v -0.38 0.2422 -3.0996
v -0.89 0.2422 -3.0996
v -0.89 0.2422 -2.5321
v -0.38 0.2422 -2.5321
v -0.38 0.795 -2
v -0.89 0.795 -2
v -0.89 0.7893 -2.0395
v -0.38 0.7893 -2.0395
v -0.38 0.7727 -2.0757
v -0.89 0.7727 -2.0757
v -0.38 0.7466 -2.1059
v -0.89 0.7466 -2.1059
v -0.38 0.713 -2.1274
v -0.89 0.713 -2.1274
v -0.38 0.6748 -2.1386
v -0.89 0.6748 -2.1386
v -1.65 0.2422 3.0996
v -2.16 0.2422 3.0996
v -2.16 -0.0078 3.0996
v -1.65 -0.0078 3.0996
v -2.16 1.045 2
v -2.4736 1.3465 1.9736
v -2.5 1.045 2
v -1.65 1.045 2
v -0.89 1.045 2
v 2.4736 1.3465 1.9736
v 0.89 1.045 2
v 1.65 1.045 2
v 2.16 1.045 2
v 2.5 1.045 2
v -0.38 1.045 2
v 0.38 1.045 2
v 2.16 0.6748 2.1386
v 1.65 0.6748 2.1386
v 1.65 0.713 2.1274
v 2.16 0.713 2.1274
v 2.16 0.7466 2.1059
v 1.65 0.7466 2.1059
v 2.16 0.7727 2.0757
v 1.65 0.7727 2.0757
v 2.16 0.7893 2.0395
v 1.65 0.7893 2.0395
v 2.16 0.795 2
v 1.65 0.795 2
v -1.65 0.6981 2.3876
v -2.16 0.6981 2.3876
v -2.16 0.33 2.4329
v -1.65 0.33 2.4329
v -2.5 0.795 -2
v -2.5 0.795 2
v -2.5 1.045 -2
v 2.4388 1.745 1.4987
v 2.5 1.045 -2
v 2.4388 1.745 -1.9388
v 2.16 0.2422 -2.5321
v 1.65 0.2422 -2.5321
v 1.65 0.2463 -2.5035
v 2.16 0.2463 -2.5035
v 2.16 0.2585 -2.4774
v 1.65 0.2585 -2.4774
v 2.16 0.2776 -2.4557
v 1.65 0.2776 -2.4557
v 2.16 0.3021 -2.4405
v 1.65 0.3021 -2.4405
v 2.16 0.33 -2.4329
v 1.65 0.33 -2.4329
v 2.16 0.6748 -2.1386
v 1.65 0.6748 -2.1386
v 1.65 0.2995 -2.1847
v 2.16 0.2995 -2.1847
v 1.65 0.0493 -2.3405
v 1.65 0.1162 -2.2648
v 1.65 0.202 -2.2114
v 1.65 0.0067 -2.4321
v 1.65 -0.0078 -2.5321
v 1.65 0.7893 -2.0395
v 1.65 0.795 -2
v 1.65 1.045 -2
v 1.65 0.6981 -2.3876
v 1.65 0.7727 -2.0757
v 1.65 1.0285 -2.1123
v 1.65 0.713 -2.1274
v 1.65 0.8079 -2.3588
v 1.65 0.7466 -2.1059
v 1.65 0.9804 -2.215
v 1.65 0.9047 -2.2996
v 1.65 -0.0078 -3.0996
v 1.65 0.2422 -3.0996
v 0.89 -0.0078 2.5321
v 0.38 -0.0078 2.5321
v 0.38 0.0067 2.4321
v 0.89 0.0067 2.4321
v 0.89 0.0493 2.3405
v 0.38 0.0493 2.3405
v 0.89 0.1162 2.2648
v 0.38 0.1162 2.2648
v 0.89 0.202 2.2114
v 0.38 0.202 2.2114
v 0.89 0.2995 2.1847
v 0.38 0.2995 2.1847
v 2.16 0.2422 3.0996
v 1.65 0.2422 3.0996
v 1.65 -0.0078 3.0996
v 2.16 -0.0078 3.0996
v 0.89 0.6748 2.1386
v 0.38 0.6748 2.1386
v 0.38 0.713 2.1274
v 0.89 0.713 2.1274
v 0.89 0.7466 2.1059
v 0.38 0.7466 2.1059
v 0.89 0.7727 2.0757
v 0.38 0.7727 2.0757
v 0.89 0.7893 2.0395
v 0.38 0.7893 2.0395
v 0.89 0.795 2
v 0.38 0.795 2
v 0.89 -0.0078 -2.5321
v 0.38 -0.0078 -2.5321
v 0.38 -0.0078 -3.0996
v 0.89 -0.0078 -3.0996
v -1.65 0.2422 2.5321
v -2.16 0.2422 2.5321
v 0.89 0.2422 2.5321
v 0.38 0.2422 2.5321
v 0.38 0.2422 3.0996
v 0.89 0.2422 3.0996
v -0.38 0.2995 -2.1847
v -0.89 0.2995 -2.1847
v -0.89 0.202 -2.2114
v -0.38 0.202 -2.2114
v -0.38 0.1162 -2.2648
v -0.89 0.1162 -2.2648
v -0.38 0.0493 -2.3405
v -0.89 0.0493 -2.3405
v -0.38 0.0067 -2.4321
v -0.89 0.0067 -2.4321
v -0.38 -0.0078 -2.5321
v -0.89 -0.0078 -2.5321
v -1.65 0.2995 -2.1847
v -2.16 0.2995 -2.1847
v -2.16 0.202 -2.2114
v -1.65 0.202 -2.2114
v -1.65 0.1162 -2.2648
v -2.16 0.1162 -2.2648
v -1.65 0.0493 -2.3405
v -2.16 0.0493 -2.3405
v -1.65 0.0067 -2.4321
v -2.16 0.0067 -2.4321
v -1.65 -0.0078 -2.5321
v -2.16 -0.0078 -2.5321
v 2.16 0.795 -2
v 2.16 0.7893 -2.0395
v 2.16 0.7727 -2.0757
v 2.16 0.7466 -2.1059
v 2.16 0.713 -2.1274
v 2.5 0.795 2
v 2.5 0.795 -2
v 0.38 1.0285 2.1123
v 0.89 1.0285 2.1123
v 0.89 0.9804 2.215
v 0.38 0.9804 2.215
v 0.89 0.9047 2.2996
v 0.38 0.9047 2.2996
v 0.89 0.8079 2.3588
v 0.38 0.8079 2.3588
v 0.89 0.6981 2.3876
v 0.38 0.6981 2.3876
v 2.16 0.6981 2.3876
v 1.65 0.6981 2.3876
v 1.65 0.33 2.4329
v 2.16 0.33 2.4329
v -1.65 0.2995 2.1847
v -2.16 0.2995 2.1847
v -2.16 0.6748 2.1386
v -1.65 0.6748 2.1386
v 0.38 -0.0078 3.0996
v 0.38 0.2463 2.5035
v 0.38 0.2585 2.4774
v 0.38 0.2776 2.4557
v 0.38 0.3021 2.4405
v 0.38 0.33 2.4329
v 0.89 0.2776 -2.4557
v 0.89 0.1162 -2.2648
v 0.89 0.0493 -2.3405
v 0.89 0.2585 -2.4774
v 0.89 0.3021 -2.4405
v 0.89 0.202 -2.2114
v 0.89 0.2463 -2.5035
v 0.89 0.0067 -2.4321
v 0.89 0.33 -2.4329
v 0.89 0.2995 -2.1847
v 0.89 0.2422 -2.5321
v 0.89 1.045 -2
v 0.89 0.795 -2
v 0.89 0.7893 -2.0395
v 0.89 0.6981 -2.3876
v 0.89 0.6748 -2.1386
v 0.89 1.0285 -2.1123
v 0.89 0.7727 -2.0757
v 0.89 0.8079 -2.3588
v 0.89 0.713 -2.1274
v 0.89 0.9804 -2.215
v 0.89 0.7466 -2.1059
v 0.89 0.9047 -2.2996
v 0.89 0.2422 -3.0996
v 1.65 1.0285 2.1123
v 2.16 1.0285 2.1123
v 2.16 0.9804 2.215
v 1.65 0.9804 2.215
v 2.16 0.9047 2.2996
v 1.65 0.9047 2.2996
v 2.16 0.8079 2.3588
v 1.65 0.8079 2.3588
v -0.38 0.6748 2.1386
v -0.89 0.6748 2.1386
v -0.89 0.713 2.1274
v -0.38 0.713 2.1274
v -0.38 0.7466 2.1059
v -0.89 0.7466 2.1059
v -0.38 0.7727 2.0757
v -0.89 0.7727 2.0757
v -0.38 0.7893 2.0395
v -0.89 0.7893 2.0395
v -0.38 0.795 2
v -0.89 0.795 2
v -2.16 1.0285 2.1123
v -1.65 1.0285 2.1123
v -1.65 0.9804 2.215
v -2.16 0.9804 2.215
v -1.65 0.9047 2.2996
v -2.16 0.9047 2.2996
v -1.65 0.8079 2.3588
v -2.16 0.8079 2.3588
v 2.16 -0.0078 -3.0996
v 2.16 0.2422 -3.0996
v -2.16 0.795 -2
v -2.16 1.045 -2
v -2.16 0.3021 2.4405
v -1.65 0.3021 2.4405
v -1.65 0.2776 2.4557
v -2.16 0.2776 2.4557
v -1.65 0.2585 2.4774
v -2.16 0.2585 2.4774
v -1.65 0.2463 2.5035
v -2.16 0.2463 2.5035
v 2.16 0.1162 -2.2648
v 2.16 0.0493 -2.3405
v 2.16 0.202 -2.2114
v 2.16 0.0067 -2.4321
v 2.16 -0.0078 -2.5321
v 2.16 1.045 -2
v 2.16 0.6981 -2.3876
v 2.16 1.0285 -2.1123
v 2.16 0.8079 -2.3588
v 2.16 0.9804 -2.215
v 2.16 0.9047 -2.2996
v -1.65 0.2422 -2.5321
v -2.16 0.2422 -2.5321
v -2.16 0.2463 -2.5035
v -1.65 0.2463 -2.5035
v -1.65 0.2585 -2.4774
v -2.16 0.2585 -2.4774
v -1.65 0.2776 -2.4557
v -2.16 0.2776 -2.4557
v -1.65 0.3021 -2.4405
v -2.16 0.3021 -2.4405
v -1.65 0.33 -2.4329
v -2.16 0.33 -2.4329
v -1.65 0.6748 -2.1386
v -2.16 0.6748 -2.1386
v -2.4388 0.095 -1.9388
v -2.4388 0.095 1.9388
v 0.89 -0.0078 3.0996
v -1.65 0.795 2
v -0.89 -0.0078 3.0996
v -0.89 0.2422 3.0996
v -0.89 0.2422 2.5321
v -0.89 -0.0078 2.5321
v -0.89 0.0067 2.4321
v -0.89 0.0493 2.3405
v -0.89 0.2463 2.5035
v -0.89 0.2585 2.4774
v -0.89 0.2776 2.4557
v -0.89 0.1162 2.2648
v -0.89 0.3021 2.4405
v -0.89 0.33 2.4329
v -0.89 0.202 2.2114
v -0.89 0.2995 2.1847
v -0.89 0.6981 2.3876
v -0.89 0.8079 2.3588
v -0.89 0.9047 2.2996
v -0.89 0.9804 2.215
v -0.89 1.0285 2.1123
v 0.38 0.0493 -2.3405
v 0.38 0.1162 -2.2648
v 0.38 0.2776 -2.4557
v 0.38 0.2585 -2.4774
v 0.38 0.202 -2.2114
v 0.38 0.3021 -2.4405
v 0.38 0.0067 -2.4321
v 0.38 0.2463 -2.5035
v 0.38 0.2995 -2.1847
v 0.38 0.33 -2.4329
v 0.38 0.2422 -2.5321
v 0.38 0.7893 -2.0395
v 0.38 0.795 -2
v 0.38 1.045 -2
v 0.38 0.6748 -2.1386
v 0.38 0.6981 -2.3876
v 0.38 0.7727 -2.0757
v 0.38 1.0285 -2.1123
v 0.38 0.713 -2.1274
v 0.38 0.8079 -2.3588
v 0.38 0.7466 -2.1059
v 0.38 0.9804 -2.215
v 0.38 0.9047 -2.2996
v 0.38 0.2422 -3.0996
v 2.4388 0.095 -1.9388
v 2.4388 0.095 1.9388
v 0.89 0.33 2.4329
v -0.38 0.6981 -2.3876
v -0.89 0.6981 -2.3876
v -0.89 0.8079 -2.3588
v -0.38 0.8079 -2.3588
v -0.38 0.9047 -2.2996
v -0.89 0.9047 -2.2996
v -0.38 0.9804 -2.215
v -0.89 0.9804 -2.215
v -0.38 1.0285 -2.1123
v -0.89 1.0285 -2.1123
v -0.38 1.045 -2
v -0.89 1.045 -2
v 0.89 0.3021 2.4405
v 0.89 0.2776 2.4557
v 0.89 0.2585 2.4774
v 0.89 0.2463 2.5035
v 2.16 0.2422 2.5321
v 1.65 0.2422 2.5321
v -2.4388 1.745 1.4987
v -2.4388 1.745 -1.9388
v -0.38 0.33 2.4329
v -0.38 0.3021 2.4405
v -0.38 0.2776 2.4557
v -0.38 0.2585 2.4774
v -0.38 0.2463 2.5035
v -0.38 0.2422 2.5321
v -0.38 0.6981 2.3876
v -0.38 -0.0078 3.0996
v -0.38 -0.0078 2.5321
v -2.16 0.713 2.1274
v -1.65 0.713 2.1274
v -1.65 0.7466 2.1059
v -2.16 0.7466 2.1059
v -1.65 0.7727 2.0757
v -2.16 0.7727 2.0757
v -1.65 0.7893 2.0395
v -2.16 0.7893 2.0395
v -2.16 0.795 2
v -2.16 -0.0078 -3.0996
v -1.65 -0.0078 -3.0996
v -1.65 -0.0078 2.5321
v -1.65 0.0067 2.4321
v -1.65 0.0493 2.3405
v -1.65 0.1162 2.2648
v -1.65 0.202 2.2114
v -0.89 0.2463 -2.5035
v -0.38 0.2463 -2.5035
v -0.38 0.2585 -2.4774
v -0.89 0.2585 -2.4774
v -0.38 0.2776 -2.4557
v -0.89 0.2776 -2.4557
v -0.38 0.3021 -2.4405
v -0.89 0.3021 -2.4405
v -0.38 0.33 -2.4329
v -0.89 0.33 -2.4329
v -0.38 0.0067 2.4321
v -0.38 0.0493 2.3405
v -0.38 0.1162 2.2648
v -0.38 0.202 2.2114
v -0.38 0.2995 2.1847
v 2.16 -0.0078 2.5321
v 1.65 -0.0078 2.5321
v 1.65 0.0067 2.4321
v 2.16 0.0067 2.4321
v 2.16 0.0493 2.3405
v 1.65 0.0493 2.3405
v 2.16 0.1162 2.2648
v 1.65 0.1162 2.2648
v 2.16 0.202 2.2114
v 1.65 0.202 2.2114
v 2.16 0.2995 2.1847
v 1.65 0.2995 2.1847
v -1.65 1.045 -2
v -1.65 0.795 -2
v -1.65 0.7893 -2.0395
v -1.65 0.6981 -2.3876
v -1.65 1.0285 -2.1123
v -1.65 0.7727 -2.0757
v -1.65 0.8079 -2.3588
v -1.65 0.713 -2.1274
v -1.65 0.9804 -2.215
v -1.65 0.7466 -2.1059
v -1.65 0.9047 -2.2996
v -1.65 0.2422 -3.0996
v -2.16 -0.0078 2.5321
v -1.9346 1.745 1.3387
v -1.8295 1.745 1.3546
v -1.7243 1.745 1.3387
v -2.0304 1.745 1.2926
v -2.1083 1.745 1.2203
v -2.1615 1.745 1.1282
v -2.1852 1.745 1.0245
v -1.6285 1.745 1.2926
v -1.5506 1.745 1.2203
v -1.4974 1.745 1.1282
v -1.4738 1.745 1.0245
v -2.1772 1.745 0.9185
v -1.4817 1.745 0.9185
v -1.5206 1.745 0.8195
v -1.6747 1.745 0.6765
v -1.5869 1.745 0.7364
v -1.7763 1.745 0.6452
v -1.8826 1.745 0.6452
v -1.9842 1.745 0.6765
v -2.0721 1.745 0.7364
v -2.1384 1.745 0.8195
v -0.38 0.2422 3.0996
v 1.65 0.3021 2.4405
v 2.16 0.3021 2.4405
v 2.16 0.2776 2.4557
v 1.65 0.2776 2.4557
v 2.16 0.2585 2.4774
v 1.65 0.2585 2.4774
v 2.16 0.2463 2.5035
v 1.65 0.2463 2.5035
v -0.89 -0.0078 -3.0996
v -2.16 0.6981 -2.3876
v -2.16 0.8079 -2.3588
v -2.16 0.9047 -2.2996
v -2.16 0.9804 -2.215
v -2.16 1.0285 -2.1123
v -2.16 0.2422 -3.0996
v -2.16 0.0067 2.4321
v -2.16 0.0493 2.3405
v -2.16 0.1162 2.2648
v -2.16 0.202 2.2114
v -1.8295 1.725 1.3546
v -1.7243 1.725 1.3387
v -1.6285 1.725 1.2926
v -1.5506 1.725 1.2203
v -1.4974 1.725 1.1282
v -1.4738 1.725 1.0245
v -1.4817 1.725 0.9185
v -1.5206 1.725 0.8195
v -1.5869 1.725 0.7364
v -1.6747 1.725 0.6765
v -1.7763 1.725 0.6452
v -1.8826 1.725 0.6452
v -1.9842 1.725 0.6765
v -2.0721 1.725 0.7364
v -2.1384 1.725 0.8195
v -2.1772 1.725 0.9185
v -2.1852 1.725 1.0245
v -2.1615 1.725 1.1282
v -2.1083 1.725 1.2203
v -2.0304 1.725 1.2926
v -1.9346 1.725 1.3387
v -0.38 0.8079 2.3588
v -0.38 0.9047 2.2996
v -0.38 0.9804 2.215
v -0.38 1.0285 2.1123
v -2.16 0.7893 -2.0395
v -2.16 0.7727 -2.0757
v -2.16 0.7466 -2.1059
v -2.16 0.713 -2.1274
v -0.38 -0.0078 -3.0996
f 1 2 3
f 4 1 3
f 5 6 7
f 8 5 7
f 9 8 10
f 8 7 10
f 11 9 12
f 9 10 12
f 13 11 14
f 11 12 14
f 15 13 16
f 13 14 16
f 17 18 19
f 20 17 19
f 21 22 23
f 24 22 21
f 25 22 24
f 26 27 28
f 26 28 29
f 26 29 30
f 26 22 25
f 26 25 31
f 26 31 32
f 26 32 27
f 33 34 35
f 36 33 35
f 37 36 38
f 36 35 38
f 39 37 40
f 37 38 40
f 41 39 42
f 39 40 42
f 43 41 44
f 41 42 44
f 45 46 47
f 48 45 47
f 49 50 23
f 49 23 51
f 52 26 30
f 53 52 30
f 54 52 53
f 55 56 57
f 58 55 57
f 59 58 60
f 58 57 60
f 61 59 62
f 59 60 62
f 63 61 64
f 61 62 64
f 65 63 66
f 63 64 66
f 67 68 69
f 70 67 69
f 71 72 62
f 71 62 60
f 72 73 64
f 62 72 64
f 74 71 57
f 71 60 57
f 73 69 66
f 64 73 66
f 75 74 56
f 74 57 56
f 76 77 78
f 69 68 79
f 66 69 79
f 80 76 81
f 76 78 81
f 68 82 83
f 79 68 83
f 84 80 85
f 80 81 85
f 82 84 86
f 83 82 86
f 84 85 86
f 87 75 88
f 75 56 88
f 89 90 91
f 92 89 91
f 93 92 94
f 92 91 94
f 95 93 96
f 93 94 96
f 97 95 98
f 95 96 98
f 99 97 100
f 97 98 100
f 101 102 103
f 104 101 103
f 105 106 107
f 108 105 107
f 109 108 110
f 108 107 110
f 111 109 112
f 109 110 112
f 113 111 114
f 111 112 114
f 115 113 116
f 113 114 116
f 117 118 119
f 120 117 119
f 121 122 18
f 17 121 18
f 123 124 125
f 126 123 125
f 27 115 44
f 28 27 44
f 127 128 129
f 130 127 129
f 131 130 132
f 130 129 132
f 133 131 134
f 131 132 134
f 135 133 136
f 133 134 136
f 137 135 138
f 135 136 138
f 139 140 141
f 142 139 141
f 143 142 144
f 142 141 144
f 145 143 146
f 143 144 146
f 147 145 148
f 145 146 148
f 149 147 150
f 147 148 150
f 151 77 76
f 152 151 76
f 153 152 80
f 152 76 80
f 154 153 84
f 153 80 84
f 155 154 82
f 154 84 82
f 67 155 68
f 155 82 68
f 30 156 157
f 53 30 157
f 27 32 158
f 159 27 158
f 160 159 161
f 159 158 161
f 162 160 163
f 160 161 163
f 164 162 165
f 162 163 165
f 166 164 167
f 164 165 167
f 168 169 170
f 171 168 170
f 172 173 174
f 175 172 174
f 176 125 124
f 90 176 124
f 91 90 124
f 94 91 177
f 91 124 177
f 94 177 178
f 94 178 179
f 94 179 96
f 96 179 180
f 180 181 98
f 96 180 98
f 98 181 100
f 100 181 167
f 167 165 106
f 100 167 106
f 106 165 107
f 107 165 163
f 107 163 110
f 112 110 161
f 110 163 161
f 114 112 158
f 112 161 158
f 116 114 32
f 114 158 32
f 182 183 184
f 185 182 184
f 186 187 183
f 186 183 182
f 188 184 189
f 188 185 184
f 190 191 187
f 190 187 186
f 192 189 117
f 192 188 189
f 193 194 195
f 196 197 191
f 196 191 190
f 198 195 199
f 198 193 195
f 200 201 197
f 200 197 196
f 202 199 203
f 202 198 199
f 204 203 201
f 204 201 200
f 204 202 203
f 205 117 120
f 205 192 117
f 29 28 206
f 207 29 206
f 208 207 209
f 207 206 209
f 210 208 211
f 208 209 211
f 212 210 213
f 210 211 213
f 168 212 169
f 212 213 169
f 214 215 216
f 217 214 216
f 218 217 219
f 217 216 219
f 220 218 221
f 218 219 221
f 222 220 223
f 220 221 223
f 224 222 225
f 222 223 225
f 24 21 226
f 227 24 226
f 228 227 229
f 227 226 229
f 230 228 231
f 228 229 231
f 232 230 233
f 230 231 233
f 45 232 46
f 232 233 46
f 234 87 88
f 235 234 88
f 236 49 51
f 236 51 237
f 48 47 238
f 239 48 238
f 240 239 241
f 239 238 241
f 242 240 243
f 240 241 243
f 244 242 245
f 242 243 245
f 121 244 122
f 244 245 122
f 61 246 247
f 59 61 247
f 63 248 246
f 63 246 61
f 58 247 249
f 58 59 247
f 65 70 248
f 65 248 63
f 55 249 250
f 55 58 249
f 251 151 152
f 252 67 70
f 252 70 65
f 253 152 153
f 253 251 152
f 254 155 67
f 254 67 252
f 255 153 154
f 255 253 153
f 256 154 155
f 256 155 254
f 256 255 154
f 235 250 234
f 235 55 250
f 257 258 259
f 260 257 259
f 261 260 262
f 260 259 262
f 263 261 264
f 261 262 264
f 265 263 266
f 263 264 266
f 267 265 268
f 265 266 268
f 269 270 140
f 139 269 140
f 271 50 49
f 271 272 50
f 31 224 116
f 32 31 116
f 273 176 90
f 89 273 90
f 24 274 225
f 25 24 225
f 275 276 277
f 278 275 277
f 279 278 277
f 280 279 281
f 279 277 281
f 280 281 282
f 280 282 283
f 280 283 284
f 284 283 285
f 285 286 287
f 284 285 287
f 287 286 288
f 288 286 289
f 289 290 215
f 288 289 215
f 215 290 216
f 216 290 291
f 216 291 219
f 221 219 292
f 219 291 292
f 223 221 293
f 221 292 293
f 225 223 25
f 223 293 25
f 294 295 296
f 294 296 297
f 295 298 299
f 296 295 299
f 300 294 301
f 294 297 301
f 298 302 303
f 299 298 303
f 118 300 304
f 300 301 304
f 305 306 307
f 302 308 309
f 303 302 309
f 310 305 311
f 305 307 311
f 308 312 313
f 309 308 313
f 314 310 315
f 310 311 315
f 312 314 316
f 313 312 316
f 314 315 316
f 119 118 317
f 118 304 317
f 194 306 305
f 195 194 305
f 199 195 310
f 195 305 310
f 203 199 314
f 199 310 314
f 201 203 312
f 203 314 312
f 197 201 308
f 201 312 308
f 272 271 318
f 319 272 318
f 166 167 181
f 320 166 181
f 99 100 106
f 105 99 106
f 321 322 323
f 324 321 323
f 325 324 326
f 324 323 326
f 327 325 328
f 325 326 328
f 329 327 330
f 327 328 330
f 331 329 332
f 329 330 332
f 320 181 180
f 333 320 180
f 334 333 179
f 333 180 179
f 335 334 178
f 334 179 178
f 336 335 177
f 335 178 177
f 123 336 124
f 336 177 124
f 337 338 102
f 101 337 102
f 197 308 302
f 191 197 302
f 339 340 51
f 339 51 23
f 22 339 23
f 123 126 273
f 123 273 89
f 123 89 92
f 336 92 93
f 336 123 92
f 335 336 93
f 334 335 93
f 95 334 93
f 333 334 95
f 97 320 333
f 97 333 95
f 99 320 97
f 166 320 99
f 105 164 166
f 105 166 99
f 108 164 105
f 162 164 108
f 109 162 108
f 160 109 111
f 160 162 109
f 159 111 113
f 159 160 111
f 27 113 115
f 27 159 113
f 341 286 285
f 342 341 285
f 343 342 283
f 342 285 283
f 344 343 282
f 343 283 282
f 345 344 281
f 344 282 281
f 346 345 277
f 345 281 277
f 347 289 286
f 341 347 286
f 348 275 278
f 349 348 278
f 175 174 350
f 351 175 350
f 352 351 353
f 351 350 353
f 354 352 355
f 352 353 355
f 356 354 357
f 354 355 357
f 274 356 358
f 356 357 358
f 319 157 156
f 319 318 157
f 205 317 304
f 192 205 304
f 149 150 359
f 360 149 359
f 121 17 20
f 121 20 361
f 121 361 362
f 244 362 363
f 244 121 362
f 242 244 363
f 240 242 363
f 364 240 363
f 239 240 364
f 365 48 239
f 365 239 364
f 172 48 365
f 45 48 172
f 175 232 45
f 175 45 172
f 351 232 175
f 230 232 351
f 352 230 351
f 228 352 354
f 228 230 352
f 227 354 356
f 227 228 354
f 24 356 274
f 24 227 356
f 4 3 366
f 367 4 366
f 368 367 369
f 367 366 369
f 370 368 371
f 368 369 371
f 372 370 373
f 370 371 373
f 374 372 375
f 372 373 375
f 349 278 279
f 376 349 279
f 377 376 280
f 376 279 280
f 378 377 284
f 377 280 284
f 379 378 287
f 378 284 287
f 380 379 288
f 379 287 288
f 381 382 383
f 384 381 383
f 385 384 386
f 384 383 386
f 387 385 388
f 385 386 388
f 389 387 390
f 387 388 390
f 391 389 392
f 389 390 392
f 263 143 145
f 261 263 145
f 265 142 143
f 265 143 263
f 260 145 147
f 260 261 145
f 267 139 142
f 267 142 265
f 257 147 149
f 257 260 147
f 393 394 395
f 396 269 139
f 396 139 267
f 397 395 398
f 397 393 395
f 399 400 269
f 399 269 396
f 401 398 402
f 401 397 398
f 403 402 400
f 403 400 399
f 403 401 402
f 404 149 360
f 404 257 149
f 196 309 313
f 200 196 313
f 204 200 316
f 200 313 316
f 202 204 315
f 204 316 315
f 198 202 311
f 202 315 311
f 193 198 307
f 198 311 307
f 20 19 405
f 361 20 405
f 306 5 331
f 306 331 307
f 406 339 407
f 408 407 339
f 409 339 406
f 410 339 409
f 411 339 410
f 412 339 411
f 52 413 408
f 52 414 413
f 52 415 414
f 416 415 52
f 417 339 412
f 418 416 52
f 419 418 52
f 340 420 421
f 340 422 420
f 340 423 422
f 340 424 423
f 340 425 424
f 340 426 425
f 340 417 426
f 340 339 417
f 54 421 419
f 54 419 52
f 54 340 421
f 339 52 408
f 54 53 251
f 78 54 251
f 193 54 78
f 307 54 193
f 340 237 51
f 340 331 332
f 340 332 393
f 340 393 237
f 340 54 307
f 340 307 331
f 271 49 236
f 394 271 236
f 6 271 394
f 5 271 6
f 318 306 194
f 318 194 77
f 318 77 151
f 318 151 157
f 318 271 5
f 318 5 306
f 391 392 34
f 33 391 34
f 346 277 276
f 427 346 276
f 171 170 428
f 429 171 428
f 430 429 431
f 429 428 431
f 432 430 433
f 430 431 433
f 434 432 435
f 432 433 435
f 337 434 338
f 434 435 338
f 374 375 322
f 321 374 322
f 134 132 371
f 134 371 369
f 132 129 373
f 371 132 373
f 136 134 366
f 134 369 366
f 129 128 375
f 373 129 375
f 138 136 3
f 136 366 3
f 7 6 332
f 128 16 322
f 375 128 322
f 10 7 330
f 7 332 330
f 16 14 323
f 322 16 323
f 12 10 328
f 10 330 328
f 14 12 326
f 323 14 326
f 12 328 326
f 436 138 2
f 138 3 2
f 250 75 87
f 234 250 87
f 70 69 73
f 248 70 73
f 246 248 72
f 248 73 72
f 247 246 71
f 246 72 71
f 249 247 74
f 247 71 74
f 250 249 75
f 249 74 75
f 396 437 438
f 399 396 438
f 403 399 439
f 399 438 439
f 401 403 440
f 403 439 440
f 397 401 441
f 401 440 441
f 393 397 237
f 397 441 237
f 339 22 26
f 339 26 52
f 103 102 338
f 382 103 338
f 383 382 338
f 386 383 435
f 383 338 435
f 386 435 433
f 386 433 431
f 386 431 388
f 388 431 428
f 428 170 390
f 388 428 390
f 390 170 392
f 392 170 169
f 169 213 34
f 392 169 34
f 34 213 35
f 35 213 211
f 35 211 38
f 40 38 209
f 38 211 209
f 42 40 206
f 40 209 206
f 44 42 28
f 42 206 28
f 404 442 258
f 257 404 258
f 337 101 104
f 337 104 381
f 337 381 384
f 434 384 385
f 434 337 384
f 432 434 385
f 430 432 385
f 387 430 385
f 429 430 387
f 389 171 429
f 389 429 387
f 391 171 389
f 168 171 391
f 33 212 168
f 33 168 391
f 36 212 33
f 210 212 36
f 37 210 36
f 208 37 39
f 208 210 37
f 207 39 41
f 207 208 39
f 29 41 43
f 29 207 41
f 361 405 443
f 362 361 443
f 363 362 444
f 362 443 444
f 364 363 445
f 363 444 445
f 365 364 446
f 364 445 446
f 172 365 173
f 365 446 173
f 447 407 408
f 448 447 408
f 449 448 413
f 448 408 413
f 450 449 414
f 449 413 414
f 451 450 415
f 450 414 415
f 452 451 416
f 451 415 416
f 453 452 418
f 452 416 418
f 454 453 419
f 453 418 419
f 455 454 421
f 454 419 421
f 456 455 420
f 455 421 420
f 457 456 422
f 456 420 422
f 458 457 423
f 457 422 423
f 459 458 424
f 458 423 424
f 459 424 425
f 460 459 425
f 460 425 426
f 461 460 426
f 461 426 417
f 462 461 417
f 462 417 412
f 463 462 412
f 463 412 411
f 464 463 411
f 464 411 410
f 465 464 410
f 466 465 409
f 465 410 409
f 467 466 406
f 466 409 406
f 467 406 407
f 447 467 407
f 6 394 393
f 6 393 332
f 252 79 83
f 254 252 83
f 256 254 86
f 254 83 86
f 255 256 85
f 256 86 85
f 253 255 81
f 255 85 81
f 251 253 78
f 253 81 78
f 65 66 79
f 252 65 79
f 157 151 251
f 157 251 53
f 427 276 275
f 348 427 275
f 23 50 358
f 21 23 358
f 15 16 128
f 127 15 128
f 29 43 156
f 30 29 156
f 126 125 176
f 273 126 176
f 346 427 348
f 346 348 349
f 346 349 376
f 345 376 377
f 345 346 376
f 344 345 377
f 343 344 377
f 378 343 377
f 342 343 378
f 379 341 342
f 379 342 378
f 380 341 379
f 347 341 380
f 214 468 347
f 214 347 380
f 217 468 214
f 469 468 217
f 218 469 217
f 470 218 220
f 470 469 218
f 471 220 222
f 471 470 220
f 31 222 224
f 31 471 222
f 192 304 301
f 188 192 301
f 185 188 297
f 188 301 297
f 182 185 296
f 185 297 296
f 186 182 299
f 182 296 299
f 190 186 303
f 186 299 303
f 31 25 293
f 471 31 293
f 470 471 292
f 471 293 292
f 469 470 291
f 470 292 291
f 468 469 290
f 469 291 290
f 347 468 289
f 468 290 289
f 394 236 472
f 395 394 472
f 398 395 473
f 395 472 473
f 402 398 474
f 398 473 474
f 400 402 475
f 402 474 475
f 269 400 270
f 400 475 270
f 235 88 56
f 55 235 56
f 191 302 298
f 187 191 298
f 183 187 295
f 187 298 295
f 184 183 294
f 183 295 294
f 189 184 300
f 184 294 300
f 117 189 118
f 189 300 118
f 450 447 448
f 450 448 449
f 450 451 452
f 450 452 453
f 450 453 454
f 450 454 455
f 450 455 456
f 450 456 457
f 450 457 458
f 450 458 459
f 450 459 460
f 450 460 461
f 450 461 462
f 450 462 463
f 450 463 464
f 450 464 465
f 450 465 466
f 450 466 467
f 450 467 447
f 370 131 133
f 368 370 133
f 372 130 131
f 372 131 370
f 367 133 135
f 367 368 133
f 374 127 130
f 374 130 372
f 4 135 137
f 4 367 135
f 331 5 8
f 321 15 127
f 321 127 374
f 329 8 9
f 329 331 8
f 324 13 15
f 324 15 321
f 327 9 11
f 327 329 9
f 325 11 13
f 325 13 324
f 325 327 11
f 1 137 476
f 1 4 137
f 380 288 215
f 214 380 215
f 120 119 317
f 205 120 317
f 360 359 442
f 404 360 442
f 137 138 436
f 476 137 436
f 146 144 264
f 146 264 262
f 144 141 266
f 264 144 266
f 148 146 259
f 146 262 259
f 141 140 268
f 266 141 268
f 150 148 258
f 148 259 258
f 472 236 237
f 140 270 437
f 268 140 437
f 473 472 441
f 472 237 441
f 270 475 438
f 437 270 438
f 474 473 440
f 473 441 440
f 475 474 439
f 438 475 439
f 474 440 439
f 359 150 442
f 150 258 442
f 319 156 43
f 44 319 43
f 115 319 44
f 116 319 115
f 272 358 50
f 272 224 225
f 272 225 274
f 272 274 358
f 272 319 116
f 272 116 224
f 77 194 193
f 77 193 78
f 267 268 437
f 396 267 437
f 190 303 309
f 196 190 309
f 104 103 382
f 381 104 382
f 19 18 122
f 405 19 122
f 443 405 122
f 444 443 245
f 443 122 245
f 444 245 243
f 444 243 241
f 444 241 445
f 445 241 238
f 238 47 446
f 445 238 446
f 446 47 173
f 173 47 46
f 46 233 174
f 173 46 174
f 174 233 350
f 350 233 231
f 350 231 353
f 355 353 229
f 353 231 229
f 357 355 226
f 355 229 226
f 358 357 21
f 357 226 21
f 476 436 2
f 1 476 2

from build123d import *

# Parameters (mm, degrees)
BOSS_EXTRUDE1_DEPTH      = 0.125
BOSS_EXTRUDE1_DEPTH_BACK = 0.125
SKETCH1_W                = 5
SKETCH1_H                = 4
SKETCH2_W                = 5
SKETCH2_H                = 4
BOSS_EXTRUDE2_DEPTH      = 0.7
BOSS_EXTRUDE2_TAPER      = 5
SKETCH3_W                = 5
SKETCH3_H                = 4
BOSS_EXTRUDE3_DEPTH      = 0.7
BOSS_EXTRUDE3_TAPER      = 5
CHAMFER1_SIZE            = 0.4
CHAMFER1_SIZE2           = 0.440025147
BOSS_EXTRUDE4_START      = 0.38
BOSS_EXTRUDE4_DEPTH      = 0.51
LPATTERN1_COUNT          = 2
LPATTERN1_PITCH          = 1.27
LPATTERN1_COL_COUNT      = 3
LPATTERN1_COL_PITCH      = 1.27
SKETCH6_R                = 0.356697025
CUT_EXTRUDE1_DEPTH       = 0.02


with BuildPart() as part:
    # Sketch1 → Boss-Extrude1 (new, two sides: drawn at the far end of the back side and taken through both)
    with BuildSketch(Plane(origin=(0, 0.92, 0), x_dir=(1, 0, 0), z_dir=(0, 1, 0)).offset(-BOSS_EXTRUDE1_DEPTH_BACK)):
        Rectangle(SKETCH1_W, SKETCH1_H)
    extrude(amount=BOSS_EXTRUDE1_DEPTH + BOSS_EXTRUDE1_DEPTH_BACK)

    # Sketch2 → Boss-Extrude2 (add)
    with BuildSketch(Plane(origin=(0, 1.045, 0), x_dir=(1, 0, 0), z_dir=(0, 1, 0))):
        Rectangle(SKETCH2_W, SKETCH2_H)
    extrude(amount=BOSS_EXTRUDE2_DEPTH, taper=BOSS_EXTRUDE2_TAPER)

    # Sketch3 → Boss-Extrude3 (add)
    with BuildSketch(Plane.XZ.offset(-0.795)):
        Rectangle(SKETCH3_W, SKETCH3_H)
    extrude(amount=BOSS_EXTRUDE3_DEPTH, taper=BOSS_EXTRUDE3_TAPER)

    # Chamfer1
    chamfer1_edges = [part.edges().sort_by_distance(p)[0] for p in [
        (0, 1.745, 1.938757936),
    ]]
    chamfer1_side = [part.faces().sort_by_distance(p)[0] for p in [
        (0, 1.393553299, 1.969505538),
    ]]
    chamfer(chamfer1_edges, length=CHAMFER1_SIZE, length2=CHAMFER1_SIZE2, reference=chamfer1_side[0])

    # Sketch5 → Boss-Extrude4 (add)
    with BuildSketch(Plane(origin=(0, 0, 0), x_dir=(0, 0, -1), z_dir=(1, 0, 0)).offset(BOSS_EXTRUDE4_START)):
        with BuildLine():
            Line((2.43285762, 0.329963507), (2.38761047, 0.698105953))
            ThreePointArc((2.38761047, 0.698105953), (2.260085254, 0.945612561), (2, 1.045))
            Line((2, 1.045), (2, 0.795))
            ThreePointArc((2, 0.795), (2.091746463, 0.76074775), (2.138599743, 0.674751237))
            Line((2.138599743, 0.674751237), (2.184724748, 0.299466331))
            ThreePointArc((2.184724748, 0.299466331), (2.300209515, 0.080013931), (2.532110769, -0.007837622))
            Line((2.532110769, -0.007837622), (3.099630301, -0.007837622))
            Line((3.099630301, -0.007837622), (3.099630301, 0.242162378))
            Line((3.099630301, 0.242162378), (2.532110769, 0.242162378))
            ThreePointArc((2.532110769, 0.242162378), (2.465853268, 0.267262822), (2.43285762, 0.329963507))
        make_face()
        with BuildLine():
            ThreePointArc((-2.138599743, 0.674751237), (-2.091746463, 0.76074775), (-2, 0.795))
            Line((-2, 0.795), (-2, 1.045))
            ThreePointArc((-2, 1.045), (-2.260085254, 0.945612561), (-2.38761047, 0.698105953))
            Line((-2.38761047, 0.698105953), (-2.43285762, 0.329963507))
            ThreePointArc((-2.43285762, 0.329963507), (-2.465853268, 0.267262822), (-2.532110769, 0.242162378))
            Line((-2.532110769, 0.242162378), (-3.099630301, 0.242162378))
            Line((-3.099630301, 0.242162378), (-3.099630301, -0.007837622))
            Line((-3.099630301, -0.007837622), (-2.532110769, -0.007837622))
            ThreePointArc((-2.532110769, -0.007837622), (-2.300209515, 0.080013931), (-2.184724748, 0.299466331))
            Line((-2.184724748, 0.299466331), (-2.138599743, 0.674751237))
        make_face()
    boss_extrude4 = extrude(amount=BOSS_EXTRUDE4_DEPTH)

    # LPattern1: Boss-Extrude4 ×2
    with Locations(*[(i * LPATTERN1_PITCH, 0, 0) for i in range(1, LPATTERN1_COUNT)]):
        add(boss_extrude4)

    # LPattern1 col: Boss-Extrude4 ×3
    with Locations(*[(-i * LPATTERN1_COL_PITCH, 0, 0) for i in range(1, LPATTERN1_COL_COUNT)]):
        add(boss_extrude4)

    # Sketch6 → Cut-Extrude1 (cut)
    with BuildSketch(Plane(origin=(0, 1.745, 0), x_dir=(1, 0, 0), z_dir=(0, 1, 0))):
        with Locations(Location((-1.829466097, -0.997890598, 0), (0, 0, 270))):
            Circle(SKETCH6_R)
    extrude(amount=-CUT_EXTRUDE1_DEPTH, mode=Mode.SUBTRACT)


solid = part.part
